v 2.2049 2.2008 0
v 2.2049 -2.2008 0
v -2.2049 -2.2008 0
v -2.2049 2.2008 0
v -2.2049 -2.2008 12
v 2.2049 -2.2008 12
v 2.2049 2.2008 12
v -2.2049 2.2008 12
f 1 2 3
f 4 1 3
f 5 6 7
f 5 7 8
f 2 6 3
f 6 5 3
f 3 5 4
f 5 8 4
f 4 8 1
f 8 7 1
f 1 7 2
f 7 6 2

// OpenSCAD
// Module names are of the form poly_<inkscape-path-id>().  As a result,
// you can associate a polygon in this OpenSCAD program with the corresponding
// SVG element in the Inkscape document by looking for the XML element with
// the attribute id="inkscape-path-id".

// fudge value is used to ensure that subtracted solids are a tad taller
// in the z dimension than the polygon being subtracted from.  This helps
// keep the resulting .stl file manifold.
fudge = 0.1;

module poly_path14(h)
{
  scale([25.4/90, -25.4/90, 1]) union()
  {
    linear_extrude(height=h)
      polygon([[-7.812500,-7.798125],[7.812500,-7.798125],[7.812500,7.798125],[-7.812500,7.798125],[-7.812500,-7.798125]]);
  }
}

module pcb_button(h)
{

poly_path14(h);
}

pcb_button(12);
